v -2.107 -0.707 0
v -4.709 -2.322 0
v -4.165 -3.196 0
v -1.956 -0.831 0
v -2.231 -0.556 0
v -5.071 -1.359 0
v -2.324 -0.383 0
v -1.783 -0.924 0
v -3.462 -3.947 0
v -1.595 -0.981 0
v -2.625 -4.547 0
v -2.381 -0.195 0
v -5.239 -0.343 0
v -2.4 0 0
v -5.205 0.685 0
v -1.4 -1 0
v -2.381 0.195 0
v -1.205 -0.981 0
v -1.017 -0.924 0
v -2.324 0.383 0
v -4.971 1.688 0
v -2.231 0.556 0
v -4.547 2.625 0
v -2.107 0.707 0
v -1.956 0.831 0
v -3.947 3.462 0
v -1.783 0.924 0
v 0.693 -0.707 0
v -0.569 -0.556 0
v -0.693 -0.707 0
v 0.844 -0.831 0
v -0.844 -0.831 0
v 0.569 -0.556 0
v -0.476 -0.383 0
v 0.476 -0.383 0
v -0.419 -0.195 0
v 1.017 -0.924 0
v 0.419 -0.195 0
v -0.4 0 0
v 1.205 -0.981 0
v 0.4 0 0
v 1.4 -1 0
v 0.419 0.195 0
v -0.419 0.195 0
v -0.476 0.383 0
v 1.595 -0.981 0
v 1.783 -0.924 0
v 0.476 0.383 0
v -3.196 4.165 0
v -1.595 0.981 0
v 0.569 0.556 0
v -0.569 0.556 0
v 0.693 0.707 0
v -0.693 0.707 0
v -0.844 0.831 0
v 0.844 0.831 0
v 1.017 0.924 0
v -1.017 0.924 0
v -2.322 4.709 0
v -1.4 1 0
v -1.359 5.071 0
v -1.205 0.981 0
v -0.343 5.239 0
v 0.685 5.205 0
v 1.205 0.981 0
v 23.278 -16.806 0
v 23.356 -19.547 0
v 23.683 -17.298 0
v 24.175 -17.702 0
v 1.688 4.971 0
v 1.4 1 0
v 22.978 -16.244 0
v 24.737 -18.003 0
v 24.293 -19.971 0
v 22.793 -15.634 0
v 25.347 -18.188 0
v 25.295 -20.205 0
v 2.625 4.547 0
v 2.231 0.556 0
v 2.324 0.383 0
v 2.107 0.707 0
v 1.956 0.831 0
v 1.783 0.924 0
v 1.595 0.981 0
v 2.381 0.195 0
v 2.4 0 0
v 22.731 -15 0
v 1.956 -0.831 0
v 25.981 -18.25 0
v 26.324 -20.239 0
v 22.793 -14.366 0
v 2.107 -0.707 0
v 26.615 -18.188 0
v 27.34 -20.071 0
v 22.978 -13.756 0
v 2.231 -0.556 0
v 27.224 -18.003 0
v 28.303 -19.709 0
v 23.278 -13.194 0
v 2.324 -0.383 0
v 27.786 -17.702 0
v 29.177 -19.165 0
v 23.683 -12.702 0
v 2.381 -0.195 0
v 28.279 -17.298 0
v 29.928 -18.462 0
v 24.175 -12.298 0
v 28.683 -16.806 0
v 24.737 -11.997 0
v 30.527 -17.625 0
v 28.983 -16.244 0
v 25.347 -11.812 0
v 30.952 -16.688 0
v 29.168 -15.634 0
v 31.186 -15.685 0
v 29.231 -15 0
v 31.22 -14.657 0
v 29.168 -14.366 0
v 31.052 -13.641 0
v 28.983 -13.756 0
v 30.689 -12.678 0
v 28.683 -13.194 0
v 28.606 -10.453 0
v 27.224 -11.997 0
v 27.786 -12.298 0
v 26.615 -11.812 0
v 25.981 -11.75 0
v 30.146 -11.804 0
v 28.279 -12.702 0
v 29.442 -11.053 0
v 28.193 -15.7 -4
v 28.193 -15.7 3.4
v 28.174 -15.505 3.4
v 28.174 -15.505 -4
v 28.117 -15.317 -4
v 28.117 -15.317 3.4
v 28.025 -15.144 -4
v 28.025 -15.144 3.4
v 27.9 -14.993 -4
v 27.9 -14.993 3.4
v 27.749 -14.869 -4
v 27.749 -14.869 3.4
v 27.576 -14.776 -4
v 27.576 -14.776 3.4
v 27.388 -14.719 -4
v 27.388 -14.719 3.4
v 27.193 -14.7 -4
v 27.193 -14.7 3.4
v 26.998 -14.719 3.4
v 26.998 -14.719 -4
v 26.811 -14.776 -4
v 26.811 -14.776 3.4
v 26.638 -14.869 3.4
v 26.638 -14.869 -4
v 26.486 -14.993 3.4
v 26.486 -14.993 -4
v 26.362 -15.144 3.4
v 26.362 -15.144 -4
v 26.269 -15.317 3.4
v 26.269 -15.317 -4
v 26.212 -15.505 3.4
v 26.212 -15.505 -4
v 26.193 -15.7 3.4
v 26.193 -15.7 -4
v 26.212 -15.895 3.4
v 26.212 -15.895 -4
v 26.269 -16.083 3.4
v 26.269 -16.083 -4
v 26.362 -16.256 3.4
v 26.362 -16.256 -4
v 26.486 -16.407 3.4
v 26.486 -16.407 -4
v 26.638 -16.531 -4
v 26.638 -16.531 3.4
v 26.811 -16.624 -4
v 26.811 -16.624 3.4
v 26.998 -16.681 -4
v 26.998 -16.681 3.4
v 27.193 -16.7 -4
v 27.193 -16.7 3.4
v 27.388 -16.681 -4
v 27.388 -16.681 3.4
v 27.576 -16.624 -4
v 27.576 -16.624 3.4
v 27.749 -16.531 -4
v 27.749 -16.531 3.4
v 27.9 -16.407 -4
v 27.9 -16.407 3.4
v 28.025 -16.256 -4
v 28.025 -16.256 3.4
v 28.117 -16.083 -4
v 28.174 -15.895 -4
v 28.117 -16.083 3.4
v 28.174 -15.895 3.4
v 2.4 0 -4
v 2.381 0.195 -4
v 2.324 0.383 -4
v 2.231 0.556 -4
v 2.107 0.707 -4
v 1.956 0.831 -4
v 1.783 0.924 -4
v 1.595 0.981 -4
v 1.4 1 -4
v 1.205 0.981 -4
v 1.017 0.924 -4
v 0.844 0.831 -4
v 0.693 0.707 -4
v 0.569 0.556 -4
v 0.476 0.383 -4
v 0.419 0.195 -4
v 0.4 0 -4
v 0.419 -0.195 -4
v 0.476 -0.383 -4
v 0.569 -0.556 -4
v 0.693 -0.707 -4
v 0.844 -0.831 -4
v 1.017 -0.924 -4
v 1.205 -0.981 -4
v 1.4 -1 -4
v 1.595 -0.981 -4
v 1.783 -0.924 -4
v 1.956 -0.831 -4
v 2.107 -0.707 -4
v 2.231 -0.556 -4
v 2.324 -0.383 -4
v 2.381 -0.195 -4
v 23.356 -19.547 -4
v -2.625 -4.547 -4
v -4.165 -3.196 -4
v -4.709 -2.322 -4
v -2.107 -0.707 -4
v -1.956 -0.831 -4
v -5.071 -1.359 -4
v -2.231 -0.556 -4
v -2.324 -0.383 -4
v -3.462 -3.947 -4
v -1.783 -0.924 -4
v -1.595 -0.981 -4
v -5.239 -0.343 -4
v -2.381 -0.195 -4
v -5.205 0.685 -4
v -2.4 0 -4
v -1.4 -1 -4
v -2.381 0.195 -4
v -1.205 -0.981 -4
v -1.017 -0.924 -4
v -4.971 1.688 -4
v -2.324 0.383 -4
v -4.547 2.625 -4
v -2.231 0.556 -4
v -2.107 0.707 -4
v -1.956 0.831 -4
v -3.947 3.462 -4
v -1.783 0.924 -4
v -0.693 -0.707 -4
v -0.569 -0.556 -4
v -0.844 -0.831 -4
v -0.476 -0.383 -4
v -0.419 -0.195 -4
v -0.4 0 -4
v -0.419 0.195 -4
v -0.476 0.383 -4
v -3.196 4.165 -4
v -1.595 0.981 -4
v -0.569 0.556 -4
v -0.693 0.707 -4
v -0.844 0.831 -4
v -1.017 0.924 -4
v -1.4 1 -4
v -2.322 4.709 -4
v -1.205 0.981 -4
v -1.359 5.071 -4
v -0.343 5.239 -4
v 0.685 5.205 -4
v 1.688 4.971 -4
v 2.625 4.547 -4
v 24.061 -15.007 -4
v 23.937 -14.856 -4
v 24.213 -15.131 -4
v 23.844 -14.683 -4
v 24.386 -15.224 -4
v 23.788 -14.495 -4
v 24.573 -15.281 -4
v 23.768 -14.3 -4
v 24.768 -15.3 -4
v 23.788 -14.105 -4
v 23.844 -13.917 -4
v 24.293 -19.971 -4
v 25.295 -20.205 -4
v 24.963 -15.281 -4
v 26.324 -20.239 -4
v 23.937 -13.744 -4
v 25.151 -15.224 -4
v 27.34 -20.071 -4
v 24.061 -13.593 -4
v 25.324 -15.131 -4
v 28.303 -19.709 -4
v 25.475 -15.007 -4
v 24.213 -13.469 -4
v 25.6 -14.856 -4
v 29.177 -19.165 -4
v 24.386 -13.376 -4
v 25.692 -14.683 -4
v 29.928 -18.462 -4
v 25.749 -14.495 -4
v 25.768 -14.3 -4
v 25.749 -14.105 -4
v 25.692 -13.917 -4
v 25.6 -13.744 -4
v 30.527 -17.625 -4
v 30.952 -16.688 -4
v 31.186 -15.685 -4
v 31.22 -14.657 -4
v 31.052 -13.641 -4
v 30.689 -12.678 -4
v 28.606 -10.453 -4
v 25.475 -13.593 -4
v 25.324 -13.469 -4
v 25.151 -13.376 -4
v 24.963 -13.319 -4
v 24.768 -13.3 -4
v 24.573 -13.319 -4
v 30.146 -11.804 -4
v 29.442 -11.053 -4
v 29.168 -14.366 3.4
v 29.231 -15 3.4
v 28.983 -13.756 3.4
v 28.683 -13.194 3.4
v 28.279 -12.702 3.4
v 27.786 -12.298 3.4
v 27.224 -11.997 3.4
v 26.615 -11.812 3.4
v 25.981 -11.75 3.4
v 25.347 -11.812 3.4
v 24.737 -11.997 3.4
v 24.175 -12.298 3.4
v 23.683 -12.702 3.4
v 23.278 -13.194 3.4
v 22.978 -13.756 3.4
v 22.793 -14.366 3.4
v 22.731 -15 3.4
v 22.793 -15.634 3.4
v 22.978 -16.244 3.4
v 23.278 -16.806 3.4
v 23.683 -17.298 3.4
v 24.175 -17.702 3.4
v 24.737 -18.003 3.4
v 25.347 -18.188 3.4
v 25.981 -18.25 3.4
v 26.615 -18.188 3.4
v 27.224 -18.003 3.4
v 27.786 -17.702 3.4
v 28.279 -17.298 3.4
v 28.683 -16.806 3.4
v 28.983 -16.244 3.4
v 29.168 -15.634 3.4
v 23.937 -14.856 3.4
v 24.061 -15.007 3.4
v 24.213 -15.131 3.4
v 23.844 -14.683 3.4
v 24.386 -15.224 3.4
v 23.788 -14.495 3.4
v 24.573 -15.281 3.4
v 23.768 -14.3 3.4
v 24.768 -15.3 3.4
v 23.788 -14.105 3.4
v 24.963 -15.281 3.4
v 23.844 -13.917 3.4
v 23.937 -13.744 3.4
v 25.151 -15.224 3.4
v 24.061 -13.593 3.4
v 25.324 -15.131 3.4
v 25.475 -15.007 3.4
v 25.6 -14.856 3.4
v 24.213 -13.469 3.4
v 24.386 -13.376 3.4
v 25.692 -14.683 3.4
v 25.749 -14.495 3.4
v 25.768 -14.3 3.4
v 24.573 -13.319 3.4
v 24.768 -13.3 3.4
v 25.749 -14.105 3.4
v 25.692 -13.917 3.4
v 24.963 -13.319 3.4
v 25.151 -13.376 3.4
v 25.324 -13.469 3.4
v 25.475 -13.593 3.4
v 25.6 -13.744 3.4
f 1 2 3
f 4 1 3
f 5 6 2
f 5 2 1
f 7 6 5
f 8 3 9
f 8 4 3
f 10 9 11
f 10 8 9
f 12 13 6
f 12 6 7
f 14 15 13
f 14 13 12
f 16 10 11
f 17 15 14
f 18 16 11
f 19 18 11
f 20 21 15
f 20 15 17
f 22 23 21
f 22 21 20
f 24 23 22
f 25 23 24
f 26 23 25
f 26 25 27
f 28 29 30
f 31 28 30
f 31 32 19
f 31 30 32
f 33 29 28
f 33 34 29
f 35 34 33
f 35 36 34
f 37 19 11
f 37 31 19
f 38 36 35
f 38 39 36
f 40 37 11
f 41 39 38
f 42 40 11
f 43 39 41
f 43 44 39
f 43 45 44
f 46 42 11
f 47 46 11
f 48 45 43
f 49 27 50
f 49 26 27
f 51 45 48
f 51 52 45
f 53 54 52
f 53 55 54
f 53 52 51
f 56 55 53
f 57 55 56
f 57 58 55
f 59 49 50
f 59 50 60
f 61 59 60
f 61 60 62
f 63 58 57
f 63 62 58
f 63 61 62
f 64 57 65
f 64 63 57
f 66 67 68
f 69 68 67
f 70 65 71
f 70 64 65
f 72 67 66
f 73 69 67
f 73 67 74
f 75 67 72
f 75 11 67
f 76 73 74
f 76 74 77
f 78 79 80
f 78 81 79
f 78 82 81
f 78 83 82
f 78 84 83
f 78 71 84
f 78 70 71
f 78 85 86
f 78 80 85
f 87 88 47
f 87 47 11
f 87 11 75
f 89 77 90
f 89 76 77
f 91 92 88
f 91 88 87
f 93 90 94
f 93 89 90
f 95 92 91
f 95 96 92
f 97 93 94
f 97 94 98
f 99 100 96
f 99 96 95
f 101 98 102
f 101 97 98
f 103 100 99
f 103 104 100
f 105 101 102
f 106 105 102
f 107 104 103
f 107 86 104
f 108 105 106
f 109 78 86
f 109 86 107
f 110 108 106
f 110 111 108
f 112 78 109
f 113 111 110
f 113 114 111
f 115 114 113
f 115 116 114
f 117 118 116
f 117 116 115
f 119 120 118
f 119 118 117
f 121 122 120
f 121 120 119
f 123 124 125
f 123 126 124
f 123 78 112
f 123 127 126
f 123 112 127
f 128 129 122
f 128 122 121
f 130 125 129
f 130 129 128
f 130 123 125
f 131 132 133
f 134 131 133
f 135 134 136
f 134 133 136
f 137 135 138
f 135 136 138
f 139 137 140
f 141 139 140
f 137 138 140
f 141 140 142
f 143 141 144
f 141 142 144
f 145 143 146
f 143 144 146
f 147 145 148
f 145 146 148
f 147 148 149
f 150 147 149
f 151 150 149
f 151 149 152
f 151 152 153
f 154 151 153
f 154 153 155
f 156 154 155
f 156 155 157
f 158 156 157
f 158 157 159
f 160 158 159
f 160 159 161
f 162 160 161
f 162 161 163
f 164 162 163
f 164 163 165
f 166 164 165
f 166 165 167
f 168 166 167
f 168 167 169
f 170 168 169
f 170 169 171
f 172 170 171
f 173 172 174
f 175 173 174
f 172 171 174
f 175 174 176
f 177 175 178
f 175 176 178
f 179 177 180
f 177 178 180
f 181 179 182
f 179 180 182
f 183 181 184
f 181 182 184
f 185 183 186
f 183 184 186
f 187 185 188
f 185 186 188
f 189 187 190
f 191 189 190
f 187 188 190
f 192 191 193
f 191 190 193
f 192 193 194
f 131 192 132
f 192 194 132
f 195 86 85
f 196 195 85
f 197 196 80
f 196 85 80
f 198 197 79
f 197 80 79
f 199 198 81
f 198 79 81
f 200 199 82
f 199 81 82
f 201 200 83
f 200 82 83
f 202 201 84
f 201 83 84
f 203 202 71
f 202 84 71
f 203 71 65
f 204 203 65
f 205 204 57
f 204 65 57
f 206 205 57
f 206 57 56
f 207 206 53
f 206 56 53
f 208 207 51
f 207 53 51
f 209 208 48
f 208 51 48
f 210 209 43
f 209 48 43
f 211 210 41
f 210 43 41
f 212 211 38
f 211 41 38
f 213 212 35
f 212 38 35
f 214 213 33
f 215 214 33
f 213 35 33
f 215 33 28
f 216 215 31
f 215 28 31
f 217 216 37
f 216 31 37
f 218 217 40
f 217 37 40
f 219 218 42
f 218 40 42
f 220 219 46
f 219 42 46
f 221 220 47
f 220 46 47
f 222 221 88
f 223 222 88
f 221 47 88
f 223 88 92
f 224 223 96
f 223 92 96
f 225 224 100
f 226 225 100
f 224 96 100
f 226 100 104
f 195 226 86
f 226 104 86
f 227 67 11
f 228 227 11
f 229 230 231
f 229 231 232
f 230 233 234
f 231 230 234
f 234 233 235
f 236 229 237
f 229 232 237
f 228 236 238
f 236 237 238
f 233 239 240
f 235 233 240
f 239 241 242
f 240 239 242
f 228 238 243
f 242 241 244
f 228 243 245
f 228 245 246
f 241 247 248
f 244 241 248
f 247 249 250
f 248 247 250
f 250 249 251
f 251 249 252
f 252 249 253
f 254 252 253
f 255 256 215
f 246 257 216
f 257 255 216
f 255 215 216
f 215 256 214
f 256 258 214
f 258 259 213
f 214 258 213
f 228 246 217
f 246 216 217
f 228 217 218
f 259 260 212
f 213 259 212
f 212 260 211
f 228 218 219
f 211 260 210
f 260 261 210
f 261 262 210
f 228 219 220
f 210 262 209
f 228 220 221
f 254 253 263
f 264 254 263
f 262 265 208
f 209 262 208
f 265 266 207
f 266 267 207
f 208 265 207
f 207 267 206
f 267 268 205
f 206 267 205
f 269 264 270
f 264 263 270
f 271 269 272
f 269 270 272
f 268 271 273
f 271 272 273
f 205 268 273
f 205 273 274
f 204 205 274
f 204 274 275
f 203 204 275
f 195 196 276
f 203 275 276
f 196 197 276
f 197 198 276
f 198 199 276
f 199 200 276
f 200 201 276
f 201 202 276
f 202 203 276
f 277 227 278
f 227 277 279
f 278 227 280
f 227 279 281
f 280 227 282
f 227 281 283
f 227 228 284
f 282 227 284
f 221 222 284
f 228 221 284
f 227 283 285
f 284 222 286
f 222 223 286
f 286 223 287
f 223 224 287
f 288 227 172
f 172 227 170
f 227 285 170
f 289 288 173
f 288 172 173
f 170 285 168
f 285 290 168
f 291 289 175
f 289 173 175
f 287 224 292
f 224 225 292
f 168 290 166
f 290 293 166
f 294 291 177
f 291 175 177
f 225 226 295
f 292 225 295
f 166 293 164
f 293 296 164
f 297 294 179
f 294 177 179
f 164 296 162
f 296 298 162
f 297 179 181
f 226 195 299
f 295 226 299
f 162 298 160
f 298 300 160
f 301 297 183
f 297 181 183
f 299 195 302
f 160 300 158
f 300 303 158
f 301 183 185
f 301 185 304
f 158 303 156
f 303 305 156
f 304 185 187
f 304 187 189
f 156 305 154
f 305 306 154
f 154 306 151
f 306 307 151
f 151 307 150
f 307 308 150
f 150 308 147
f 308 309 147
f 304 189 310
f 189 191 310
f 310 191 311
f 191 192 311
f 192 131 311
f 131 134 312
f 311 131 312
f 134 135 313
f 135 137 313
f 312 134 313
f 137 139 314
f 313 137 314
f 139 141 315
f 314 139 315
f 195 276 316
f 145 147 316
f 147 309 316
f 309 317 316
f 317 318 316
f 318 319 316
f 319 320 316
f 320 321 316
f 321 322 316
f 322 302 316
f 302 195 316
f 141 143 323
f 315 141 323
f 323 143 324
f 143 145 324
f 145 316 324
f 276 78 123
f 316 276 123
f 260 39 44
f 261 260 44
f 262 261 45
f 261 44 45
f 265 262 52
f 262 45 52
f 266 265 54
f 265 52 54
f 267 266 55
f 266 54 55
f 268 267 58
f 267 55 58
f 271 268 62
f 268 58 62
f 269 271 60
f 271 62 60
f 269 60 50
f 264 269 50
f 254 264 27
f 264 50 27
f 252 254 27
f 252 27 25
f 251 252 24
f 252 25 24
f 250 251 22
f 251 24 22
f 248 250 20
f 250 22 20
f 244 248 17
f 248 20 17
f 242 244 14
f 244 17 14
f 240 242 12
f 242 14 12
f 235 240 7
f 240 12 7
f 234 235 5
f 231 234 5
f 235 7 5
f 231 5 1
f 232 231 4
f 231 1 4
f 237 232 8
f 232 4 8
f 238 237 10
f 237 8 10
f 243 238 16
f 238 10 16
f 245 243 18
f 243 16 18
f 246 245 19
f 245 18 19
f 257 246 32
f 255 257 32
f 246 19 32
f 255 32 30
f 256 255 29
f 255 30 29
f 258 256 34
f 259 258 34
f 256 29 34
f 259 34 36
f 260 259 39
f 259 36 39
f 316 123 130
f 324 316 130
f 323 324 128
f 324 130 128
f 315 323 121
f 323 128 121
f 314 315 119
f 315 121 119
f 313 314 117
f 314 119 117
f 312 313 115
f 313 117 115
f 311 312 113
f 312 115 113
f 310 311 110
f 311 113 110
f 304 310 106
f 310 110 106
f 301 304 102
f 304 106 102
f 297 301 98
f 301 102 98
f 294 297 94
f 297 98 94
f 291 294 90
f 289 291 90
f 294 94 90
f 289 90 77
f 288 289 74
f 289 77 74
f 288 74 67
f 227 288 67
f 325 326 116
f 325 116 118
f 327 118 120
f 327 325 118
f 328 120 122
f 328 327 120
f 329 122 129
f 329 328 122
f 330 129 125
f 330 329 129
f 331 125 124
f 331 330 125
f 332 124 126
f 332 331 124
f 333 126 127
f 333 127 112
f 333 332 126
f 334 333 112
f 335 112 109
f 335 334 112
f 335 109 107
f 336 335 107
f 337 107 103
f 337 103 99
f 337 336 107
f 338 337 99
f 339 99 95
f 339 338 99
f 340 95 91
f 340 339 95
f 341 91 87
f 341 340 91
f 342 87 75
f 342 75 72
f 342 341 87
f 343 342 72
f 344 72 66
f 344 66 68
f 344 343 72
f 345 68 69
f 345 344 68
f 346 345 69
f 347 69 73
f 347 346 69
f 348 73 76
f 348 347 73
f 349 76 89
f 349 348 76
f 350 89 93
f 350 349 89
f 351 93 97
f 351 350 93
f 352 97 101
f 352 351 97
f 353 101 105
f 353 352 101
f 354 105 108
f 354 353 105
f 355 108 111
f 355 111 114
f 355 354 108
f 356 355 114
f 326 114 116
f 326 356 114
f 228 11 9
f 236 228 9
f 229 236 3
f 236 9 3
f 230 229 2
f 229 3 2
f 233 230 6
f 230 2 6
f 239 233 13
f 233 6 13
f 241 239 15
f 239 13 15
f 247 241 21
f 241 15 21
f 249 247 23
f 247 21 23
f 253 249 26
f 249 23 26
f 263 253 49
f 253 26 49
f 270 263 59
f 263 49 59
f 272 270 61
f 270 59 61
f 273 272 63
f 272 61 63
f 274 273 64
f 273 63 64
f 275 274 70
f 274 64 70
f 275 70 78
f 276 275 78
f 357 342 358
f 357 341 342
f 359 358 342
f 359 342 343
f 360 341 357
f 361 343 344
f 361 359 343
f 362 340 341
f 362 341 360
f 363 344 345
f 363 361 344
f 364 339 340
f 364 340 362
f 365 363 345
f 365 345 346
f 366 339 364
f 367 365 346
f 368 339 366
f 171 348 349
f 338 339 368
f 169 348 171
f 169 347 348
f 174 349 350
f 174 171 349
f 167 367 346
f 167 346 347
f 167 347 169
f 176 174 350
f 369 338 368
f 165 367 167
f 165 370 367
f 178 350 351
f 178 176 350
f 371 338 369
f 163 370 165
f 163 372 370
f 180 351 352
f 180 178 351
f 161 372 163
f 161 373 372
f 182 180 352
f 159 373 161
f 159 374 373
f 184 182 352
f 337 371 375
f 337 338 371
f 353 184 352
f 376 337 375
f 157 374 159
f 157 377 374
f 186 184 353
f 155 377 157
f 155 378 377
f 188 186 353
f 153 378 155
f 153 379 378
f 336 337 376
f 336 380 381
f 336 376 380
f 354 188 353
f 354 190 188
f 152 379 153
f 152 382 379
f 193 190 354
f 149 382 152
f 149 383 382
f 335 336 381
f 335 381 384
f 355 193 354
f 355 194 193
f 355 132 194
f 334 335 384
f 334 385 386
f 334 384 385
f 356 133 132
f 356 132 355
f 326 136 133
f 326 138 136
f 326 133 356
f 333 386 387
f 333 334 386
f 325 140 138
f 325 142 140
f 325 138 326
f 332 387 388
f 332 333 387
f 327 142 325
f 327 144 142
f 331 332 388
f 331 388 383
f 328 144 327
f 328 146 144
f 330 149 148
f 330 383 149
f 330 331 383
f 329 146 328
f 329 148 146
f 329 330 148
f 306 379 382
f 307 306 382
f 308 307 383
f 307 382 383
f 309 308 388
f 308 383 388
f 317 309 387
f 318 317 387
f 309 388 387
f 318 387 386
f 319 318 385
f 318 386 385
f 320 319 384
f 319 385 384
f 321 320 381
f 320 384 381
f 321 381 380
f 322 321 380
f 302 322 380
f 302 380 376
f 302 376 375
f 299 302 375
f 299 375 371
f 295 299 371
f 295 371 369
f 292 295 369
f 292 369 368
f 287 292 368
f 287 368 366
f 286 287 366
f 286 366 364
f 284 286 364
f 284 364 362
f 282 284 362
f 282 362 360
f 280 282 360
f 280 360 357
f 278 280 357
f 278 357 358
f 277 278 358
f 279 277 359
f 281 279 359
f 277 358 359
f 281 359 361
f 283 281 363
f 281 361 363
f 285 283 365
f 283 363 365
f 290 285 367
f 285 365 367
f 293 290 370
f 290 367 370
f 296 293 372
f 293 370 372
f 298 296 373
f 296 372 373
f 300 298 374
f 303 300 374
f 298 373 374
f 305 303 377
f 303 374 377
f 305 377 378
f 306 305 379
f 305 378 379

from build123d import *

# Parameters (mm, degrees)
LINK_SKETCH_R       = 1
LINK_EXTRUDE_DEPTH  = 4
JOINT_START         = 3.4
SKETCH1_3_R         = 3.25
SKETCH1_3_R_2       = 1
JOINT_EXTRUDE_DEPTH = 3.4


with BuildPart() as part:
    # Link Sketch → Link Extrude (new body)
    with BuildSketch(Plane.XY):
        with BuildLine():
            Line((-2.625, -4.54663337), (23.355762114, -19.54663337))
            ThreePointArc((23.355762114, -19.54663337), (30.527395483, -17.625), (28.605762114, -10.45336663))
            Line((28.605762114, -10.45336663), (2.625, 4.54663337))
            ThreePointArc((2.625, 4.54663337), (-4.54663337, 2.625), (-2.625, -4.54663337))
        make_face()
        with Locations((-1.4, 0)):
            Circle(LINK_SKETCH_R, mode=Mode.SUBTRACT)
        with Locations((1.4, 0)):
            Circle(LINK_SKETCH_R, mode=Mode.SUBTRACT)
        with Locations((27.193197679, -15.7)):
            Circle(LINK_SKETCH_R, mode=Mode.SUBTRACT)
        with Locations((24.768326548, -14.3)):
            Circle(LINK_SKETCH_R, mode=Mode.SUBTRACT)
    extrude(amount=-LINK_EXTRUDE_DEPTH)

    # Sketch1<3> → Joint Extrude (add)
    with BuildSketch(Plane.XY.offset(JOINT_START)):
        with Locations((25.980762114, -15)):
            Circle(SKETCH1_3_R)
        with Locations((24.768326548, -14.3)):
            Circle(SKETCH1_3_R_2, mode=Mode.SUBTRACT)
        with Locations((27.193197679, -15.7)):
            Circle(SKETCH1_3_R_2, mode=Mode.SUBTRACT)
    extrude(amount=-JOINT_EXTRUDE_DEPTH)


solid = part.part
